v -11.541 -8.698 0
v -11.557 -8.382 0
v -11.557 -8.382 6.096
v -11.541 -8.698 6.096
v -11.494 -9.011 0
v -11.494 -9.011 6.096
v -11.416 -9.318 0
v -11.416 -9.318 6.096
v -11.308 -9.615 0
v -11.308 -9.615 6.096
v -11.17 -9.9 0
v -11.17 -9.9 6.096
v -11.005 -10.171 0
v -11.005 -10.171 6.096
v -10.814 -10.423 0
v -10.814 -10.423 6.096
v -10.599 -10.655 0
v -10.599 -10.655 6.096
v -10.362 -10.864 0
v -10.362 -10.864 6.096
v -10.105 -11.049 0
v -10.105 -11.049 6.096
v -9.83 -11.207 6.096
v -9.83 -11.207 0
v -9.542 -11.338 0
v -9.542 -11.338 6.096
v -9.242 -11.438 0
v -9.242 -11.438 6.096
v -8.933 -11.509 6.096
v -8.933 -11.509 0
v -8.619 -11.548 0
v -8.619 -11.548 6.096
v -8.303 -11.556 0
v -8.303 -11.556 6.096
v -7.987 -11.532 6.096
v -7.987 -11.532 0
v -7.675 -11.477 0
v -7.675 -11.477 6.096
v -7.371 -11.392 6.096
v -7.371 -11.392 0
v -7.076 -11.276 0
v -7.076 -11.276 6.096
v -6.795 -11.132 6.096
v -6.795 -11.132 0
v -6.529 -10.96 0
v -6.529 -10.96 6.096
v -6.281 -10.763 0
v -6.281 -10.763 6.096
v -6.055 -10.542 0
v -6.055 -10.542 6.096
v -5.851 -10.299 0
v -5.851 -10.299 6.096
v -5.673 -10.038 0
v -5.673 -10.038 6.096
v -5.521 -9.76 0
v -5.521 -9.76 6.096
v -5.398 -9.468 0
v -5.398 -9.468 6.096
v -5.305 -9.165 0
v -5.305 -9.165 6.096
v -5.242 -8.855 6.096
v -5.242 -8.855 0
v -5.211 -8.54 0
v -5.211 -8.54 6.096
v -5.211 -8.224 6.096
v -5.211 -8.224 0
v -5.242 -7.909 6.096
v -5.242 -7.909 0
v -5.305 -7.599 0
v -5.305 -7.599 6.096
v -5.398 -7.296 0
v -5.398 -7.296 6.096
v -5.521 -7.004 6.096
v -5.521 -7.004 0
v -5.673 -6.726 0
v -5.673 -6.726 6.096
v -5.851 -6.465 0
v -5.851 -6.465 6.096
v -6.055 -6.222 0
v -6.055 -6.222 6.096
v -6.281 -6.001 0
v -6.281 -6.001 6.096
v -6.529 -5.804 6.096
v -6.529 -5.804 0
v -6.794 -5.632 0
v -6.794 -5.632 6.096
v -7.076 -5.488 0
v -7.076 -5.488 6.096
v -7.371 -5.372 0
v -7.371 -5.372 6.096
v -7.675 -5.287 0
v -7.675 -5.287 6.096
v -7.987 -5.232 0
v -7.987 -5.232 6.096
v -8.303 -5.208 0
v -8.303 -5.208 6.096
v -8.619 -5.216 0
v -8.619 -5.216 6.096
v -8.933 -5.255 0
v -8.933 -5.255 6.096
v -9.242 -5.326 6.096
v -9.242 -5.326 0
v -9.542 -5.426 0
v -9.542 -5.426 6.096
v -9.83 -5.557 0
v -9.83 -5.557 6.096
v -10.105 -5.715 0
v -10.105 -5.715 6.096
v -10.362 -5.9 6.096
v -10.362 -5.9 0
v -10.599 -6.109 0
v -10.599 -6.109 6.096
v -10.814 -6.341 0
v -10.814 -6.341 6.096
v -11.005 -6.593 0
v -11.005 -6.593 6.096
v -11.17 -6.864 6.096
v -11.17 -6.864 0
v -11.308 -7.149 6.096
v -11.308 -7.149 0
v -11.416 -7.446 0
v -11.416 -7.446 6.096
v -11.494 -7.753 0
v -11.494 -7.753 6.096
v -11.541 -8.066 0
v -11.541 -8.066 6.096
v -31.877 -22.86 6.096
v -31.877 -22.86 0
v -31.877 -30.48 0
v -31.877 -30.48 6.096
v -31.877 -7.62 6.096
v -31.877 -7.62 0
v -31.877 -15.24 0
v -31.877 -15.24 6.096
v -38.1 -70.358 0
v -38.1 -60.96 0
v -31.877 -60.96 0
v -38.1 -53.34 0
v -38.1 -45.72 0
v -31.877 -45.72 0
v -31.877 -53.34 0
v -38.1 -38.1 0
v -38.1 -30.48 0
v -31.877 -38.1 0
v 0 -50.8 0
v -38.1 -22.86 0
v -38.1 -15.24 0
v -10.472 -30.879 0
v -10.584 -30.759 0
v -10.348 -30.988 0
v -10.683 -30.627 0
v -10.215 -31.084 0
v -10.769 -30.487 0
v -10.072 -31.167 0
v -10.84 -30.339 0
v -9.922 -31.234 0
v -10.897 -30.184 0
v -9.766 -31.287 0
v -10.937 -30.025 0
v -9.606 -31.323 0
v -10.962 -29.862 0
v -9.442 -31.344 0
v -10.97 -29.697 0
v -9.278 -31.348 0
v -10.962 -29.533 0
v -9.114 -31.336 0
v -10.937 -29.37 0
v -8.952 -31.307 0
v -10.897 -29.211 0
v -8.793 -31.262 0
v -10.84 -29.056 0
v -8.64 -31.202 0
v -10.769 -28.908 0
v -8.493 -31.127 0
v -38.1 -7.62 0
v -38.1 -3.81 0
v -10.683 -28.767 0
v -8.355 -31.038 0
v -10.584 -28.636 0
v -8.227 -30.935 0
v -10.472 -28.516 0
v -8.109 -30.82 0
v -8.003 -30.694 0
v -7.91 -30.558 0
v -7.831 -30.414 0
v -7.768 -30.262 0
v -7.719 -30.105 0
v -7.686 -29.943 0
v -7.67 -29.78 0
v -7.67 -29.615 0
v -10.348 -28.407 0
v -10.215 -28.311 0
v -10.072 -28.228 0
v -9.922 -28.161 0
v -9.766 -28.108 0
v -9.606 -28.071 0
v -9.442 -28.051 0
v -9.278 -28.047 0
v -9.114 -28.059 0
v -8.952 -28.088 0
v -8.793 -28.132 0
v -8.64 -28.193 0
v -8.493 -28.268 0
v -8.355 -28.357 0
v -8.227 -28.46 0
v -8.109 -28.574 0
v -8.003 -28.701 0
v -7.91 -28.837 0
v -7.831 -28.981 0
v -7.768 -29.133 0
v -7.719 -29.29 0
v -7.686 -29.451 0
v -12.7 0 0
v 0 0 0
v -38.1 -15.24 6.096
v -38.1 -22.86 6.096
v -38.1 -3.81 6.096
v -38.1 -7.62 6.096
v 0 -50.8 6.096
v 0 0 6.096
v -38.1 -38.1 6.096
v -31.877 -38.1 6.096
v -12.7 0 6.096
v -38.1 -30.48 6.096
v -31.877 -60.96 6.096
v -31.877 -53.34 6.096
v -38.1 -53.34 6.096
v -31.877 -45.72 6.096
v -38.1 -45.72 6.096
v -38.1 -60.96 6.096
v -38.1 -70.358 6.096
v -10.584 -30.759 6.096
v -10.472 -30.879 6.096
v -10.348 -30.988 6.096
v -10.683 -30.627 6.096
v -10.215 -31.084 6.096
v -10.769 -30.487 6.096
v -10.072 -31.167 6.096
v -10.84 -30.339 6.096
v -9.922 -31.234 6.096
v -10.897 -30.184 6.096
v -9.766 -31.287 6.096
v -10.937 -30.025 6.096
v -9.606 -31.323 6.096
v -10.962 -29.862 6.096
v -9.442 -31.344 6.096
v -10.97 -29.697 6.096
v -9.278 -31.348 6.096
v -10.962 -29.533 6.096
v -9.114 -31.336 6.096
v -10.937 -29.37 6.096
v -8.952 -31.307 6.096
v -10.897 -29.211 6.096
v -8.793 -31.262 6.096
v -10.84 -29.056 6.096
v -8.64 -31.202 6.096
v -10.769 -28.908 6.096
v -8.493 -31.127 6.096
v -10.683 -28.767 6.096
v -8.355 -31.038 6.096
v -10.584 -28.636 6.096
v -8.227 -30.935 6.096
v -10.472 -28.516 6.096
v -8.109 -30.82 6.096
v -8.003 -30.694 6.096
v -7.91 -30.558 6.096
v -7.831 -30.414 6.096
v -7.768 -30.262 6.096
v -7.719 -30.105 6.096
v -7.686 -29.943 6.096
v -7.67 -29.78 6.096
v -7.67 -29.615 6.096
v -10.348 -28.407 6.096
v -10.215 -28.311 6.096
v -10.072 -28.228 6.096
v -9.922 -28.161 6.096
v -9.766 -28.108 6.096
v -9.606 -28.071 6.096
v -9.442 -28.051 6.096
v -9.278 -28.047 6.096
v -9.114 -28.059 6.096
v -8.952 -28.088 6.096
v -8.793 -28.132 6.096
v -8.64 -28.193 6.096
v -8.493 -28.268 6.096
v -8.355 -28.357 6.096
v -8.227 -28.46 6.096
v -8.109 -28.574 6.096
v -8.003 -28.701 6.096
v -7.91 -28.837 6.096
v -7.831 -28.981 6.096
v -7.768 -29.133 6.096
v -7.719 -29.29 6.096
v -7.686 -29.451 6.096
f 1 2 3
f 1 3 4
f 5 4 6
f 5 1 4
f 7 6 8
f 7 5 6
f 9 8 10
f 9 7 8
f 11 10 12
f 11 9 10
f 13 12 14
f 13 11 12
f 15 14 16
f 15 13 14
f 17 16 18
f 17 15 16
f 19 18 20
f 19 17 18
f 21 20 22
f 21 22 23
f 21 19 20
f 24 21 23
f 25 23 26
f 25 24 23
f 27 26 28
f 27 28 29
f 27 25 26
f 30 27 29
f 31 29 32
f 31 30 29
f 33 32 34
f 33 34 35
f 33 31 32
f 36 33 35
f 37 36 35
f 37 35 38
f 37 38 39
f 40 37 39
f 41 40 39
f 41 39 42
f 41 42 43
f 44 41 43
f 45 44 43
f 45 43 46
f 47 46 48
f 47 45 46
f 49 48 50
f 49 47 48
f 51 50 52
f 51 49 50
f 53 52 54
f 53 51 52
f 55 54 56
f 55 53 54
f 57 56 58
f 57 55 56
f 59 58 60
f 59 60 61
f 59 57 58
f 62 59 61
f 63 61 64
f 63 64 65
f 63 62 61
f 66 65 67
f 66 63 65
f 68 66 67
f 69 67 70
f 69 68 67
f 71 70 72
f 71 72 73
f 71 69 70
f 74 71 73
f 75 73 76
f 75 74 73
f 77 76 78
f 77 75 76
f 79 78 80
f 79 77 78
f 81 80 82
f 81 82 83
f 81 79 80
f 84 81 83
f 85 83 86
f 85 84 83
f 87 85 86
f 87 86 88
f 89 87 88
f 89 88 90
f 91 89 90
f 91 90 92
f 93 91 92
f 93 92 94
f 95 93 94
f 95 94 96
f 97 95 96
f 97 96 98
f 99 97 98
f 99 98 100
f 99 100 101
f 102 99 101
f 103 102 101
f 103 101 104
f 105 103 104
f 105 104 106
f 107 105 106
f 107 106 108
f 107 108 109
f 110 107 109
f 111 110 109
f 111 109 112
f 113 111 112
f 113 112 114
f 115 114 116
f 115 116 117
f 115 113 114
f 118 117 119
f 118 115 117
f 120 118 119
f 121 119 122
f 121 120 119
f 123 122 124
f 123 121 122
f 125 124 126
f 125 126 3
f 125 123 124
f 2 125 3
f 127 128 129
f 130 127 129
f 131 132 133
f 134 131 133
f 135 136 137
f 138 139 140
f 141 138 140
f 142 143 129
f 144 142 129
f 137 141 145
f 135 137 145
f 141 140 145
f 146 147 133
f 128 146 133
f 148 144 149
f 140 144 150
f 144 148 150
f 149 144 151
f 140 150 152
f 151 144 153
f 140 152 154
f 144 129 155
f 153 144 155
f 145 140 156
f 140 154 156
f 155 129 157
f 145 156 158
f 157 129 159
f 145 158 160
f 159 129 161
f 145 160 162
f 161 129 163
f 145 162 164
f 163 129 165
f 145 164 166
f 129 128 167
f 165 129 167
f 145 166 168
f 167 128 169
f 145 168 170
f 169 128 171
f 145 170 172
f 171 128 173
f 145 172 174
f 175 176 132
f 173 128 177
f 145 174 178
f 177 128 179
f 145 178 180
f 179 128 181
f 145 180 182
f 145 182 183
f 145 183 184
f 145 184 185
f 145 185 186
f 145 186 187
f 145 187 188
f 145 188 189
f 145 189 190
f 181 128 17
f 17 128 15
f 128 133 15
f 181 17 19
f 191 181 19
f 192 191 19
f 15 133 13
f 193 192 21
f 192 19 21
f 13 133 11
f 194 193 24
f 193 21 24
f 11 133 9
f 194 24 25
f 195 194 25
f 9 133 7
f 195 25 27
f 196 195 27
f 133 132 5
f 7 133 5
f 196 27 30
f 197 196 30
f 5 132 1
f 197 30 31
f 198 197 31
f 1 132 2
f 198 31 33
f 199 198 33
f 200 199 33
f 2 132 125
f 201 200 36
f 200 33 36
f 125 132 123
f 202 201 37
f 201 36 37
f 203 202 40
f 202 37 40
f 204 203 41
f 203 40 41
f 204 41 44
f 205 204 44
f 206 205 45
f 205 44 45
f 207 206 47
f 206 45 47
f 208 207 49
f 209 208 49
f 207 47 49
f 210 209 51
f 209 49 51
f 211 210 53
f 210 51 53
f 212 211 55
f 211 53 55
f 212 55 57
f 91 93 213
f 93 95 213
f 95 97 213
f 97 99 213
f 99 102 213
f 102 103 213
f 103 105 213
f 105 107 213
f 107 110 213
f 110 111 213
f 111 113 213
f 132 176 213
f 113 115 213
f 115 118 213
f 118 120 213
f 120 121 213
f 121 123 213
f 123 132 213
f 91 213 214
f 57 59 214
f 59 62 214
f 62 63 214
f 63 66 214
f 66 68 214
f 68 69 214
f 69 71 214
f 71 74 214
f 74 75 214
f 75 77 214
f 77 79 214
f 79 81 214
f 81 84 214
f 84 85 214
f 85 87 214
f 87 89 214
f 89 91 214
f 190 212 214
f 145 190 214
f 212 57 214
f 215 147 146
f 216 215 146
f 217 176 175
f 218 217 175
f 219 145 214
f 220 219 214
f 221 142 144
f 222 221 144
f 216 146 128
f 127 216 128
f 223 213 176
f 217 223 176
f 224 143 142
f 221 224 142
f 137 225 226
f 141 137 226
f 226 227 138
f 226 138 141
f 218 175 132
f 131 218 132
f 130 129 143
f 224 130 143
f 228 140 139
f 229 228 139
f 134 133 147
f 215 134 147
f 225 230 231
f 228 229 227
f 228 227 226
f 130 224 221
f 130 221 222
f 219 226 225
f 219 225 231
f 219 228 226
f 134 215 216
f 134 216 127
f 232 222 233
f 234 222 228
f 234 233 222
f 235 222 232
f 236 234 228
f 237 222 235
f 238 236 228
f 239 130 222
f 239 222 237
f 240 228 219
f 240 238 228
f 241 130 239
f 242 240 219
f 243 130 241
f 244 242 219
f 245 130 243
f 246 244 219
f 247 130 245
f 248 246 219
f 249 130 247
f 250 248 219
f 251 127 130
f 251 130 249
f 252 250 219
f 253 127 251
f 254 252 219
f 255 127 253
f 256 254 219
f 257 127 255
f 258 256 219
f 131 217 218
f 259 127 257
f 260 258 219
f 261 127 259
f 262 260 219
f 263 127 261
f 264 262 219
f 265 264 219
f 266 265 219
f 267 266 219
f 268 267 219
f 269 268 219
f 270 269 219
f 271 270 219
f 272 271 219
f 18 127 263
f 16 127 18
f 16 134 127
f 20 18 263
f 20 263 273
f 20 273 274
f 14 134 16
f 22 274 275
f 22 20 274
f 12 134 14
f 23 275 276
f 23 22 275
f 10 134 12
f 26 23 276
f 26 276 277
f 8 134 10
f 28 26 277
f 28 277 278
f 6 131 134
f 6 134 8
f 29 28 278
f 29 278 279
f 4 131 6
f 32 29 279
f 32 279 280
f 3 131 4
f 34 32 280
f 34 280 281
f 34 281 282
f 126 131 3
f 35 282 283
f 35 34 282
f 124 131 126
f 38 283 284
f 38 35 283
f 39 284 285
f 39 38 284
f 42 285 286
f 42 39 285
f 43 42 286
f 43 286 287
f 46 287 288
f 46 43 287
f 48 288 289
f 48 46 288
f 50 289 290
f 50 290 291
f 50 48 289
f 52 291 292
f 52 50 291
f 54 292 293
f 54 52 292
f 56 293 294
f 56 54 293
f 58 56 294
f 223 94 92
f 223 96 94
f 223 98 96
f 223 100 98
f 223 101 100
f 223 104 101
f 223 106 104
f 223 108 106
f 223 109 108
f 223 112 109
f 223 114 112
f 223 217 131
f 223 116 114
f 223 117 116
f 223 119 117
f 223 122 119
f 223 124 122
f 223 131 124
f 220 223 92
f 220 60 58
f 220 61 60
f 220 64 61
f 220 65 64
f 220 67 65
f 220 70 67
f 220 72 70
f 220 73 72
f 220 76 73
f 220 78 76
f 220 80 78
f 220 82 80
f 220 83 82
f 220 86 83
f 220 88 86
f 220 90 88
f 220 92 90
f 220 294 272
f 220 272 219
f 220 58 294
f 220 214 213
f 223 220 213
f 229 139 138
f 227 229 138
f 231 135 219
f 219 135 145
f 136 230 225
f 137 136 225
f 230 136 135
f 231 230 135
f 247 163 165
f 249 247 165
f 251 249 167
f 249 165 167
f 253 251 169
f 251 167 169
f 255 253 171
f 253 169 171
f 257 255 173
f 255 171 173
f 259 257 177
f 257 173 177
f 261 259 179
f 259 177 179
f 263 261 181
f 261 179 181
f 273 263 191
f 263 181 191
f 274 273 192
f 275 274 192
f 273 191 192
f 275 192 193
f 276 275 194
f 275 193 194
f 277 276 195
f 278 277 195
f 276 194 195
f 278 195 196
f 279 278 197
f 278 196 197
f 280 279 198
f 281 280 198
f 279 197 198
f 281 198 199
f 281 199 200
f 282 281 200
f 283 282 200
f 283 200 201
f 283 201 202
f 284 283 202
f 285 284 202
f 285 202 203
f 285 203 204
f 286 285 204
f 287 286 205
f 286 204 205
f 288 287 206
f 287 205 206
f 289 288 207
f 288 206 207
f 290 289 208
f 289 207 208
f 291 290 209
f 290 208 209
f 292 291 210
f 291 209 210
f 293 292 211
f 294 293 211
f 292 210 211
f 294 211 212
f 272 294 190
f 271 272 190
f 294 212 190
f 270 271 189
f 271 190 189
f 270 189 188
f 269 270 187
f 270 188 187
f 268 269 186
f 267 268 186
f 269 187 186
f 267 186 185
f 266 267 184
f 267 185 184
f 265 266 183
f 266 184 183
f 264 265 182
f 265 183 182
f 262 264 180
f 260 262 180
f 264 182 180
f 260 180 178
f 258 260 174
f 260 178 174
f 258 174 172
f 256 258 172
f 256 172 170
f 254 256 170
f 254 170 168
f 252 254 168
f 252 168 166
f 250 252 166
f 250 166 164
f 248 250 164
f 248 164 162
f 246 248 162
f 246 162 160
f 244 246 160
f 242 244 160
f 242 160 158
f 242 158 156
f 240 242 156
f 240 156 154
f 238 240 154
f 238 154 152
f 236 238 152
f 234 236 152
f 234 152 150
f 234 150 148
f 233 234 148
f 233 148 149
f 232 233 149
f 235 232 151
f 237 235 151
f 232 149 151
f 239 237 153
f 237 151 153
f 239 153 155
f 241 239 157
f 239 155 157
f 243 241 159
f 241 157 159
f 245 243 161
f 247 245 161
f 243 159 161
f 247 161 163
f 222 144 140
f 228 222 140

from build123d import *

# Parameters (mm, degrees)
SKETCH1_R           = 3.175
BOSS_EXTRUDE1_DEPTH = 6.096
CUT_EXTRUDE1_DEPTH  = 8.636
SKETCH4_W           = 6.223
SKETCH4_H           = 7.62
CUT_EXTRUDE2_DEPTH  = 81.243500547
SKETCH5_R           = 1.651
CUT_EXTRUDE4_DEPTH  = 6.096


with BuildPart() as part:
    # Sketch1 → Boss-Extrude1 (new body)
    with BuildSketch(Plane.XY):
        Polygon((0, 0), (-38.1, 0), (-38.1, -7.62), (-31.877, -7.62), (-31.877, -15.24), (-38.1, -15.24), (-38.1, -22.86), (-31.877, -22.86), (-31.877, -30.48), (-38.1, -30.48), (-38.1, -38.1), (-31.877, -38.1), (-31.877, -45.72), (-38.1, -45.72), (-38.1, -70.358), (0, -50.8), align=None)
        with Locations(Location((-8.382, -8.382, 0), (0, 0, 180))):
            Circle(SKETCH1_R, mode=Mode.SUBTRACT)
    extrude(amount=BOSS_EXTRUDE1_DEPTH)

    # Sketch2 → Cut-Extrude1 (cut)
    with BuildSketch(Plane(origin=(0, 0, 0), x_dir=(-1, 0, 0), z_dir=(0, 0, -1))):
        Polygon((38.1, 0), (12.7, 0), (38.1, -3.81), align=None)
    extrude(amount=-CUT_EXTRUDE1_DEPTH, mode=Mode.SUBTRACT)

    # Sketch4 → Cut-Extrude2 (cut, through all)
    with BuildSketch(Plane.XY.offset(6.096)):
        with Locations((-34.9885, -57.15)):
            Rectangle(SKETCH4_W, SKETCH4_H)
    extrude(amount=-CUT_EXTRUDE2_DEPTH, mode=Mode.SUBTRACT)

    # Sketch5 → Cut-Extrude4 (cut)
    with BuildSketch(Plane(origin=(0, 0, 0), x_dir=(-1, 0, 0), z_dir=(0, 0, -1))):
        with Locations((9.318987701, -29.697415784)):
            Circle(SKETCH5_R)
    extrude(amount=-CUT_EXTRUDE4_DEPTH, mode=Mode.SUBTRACT)


solid = part.part
